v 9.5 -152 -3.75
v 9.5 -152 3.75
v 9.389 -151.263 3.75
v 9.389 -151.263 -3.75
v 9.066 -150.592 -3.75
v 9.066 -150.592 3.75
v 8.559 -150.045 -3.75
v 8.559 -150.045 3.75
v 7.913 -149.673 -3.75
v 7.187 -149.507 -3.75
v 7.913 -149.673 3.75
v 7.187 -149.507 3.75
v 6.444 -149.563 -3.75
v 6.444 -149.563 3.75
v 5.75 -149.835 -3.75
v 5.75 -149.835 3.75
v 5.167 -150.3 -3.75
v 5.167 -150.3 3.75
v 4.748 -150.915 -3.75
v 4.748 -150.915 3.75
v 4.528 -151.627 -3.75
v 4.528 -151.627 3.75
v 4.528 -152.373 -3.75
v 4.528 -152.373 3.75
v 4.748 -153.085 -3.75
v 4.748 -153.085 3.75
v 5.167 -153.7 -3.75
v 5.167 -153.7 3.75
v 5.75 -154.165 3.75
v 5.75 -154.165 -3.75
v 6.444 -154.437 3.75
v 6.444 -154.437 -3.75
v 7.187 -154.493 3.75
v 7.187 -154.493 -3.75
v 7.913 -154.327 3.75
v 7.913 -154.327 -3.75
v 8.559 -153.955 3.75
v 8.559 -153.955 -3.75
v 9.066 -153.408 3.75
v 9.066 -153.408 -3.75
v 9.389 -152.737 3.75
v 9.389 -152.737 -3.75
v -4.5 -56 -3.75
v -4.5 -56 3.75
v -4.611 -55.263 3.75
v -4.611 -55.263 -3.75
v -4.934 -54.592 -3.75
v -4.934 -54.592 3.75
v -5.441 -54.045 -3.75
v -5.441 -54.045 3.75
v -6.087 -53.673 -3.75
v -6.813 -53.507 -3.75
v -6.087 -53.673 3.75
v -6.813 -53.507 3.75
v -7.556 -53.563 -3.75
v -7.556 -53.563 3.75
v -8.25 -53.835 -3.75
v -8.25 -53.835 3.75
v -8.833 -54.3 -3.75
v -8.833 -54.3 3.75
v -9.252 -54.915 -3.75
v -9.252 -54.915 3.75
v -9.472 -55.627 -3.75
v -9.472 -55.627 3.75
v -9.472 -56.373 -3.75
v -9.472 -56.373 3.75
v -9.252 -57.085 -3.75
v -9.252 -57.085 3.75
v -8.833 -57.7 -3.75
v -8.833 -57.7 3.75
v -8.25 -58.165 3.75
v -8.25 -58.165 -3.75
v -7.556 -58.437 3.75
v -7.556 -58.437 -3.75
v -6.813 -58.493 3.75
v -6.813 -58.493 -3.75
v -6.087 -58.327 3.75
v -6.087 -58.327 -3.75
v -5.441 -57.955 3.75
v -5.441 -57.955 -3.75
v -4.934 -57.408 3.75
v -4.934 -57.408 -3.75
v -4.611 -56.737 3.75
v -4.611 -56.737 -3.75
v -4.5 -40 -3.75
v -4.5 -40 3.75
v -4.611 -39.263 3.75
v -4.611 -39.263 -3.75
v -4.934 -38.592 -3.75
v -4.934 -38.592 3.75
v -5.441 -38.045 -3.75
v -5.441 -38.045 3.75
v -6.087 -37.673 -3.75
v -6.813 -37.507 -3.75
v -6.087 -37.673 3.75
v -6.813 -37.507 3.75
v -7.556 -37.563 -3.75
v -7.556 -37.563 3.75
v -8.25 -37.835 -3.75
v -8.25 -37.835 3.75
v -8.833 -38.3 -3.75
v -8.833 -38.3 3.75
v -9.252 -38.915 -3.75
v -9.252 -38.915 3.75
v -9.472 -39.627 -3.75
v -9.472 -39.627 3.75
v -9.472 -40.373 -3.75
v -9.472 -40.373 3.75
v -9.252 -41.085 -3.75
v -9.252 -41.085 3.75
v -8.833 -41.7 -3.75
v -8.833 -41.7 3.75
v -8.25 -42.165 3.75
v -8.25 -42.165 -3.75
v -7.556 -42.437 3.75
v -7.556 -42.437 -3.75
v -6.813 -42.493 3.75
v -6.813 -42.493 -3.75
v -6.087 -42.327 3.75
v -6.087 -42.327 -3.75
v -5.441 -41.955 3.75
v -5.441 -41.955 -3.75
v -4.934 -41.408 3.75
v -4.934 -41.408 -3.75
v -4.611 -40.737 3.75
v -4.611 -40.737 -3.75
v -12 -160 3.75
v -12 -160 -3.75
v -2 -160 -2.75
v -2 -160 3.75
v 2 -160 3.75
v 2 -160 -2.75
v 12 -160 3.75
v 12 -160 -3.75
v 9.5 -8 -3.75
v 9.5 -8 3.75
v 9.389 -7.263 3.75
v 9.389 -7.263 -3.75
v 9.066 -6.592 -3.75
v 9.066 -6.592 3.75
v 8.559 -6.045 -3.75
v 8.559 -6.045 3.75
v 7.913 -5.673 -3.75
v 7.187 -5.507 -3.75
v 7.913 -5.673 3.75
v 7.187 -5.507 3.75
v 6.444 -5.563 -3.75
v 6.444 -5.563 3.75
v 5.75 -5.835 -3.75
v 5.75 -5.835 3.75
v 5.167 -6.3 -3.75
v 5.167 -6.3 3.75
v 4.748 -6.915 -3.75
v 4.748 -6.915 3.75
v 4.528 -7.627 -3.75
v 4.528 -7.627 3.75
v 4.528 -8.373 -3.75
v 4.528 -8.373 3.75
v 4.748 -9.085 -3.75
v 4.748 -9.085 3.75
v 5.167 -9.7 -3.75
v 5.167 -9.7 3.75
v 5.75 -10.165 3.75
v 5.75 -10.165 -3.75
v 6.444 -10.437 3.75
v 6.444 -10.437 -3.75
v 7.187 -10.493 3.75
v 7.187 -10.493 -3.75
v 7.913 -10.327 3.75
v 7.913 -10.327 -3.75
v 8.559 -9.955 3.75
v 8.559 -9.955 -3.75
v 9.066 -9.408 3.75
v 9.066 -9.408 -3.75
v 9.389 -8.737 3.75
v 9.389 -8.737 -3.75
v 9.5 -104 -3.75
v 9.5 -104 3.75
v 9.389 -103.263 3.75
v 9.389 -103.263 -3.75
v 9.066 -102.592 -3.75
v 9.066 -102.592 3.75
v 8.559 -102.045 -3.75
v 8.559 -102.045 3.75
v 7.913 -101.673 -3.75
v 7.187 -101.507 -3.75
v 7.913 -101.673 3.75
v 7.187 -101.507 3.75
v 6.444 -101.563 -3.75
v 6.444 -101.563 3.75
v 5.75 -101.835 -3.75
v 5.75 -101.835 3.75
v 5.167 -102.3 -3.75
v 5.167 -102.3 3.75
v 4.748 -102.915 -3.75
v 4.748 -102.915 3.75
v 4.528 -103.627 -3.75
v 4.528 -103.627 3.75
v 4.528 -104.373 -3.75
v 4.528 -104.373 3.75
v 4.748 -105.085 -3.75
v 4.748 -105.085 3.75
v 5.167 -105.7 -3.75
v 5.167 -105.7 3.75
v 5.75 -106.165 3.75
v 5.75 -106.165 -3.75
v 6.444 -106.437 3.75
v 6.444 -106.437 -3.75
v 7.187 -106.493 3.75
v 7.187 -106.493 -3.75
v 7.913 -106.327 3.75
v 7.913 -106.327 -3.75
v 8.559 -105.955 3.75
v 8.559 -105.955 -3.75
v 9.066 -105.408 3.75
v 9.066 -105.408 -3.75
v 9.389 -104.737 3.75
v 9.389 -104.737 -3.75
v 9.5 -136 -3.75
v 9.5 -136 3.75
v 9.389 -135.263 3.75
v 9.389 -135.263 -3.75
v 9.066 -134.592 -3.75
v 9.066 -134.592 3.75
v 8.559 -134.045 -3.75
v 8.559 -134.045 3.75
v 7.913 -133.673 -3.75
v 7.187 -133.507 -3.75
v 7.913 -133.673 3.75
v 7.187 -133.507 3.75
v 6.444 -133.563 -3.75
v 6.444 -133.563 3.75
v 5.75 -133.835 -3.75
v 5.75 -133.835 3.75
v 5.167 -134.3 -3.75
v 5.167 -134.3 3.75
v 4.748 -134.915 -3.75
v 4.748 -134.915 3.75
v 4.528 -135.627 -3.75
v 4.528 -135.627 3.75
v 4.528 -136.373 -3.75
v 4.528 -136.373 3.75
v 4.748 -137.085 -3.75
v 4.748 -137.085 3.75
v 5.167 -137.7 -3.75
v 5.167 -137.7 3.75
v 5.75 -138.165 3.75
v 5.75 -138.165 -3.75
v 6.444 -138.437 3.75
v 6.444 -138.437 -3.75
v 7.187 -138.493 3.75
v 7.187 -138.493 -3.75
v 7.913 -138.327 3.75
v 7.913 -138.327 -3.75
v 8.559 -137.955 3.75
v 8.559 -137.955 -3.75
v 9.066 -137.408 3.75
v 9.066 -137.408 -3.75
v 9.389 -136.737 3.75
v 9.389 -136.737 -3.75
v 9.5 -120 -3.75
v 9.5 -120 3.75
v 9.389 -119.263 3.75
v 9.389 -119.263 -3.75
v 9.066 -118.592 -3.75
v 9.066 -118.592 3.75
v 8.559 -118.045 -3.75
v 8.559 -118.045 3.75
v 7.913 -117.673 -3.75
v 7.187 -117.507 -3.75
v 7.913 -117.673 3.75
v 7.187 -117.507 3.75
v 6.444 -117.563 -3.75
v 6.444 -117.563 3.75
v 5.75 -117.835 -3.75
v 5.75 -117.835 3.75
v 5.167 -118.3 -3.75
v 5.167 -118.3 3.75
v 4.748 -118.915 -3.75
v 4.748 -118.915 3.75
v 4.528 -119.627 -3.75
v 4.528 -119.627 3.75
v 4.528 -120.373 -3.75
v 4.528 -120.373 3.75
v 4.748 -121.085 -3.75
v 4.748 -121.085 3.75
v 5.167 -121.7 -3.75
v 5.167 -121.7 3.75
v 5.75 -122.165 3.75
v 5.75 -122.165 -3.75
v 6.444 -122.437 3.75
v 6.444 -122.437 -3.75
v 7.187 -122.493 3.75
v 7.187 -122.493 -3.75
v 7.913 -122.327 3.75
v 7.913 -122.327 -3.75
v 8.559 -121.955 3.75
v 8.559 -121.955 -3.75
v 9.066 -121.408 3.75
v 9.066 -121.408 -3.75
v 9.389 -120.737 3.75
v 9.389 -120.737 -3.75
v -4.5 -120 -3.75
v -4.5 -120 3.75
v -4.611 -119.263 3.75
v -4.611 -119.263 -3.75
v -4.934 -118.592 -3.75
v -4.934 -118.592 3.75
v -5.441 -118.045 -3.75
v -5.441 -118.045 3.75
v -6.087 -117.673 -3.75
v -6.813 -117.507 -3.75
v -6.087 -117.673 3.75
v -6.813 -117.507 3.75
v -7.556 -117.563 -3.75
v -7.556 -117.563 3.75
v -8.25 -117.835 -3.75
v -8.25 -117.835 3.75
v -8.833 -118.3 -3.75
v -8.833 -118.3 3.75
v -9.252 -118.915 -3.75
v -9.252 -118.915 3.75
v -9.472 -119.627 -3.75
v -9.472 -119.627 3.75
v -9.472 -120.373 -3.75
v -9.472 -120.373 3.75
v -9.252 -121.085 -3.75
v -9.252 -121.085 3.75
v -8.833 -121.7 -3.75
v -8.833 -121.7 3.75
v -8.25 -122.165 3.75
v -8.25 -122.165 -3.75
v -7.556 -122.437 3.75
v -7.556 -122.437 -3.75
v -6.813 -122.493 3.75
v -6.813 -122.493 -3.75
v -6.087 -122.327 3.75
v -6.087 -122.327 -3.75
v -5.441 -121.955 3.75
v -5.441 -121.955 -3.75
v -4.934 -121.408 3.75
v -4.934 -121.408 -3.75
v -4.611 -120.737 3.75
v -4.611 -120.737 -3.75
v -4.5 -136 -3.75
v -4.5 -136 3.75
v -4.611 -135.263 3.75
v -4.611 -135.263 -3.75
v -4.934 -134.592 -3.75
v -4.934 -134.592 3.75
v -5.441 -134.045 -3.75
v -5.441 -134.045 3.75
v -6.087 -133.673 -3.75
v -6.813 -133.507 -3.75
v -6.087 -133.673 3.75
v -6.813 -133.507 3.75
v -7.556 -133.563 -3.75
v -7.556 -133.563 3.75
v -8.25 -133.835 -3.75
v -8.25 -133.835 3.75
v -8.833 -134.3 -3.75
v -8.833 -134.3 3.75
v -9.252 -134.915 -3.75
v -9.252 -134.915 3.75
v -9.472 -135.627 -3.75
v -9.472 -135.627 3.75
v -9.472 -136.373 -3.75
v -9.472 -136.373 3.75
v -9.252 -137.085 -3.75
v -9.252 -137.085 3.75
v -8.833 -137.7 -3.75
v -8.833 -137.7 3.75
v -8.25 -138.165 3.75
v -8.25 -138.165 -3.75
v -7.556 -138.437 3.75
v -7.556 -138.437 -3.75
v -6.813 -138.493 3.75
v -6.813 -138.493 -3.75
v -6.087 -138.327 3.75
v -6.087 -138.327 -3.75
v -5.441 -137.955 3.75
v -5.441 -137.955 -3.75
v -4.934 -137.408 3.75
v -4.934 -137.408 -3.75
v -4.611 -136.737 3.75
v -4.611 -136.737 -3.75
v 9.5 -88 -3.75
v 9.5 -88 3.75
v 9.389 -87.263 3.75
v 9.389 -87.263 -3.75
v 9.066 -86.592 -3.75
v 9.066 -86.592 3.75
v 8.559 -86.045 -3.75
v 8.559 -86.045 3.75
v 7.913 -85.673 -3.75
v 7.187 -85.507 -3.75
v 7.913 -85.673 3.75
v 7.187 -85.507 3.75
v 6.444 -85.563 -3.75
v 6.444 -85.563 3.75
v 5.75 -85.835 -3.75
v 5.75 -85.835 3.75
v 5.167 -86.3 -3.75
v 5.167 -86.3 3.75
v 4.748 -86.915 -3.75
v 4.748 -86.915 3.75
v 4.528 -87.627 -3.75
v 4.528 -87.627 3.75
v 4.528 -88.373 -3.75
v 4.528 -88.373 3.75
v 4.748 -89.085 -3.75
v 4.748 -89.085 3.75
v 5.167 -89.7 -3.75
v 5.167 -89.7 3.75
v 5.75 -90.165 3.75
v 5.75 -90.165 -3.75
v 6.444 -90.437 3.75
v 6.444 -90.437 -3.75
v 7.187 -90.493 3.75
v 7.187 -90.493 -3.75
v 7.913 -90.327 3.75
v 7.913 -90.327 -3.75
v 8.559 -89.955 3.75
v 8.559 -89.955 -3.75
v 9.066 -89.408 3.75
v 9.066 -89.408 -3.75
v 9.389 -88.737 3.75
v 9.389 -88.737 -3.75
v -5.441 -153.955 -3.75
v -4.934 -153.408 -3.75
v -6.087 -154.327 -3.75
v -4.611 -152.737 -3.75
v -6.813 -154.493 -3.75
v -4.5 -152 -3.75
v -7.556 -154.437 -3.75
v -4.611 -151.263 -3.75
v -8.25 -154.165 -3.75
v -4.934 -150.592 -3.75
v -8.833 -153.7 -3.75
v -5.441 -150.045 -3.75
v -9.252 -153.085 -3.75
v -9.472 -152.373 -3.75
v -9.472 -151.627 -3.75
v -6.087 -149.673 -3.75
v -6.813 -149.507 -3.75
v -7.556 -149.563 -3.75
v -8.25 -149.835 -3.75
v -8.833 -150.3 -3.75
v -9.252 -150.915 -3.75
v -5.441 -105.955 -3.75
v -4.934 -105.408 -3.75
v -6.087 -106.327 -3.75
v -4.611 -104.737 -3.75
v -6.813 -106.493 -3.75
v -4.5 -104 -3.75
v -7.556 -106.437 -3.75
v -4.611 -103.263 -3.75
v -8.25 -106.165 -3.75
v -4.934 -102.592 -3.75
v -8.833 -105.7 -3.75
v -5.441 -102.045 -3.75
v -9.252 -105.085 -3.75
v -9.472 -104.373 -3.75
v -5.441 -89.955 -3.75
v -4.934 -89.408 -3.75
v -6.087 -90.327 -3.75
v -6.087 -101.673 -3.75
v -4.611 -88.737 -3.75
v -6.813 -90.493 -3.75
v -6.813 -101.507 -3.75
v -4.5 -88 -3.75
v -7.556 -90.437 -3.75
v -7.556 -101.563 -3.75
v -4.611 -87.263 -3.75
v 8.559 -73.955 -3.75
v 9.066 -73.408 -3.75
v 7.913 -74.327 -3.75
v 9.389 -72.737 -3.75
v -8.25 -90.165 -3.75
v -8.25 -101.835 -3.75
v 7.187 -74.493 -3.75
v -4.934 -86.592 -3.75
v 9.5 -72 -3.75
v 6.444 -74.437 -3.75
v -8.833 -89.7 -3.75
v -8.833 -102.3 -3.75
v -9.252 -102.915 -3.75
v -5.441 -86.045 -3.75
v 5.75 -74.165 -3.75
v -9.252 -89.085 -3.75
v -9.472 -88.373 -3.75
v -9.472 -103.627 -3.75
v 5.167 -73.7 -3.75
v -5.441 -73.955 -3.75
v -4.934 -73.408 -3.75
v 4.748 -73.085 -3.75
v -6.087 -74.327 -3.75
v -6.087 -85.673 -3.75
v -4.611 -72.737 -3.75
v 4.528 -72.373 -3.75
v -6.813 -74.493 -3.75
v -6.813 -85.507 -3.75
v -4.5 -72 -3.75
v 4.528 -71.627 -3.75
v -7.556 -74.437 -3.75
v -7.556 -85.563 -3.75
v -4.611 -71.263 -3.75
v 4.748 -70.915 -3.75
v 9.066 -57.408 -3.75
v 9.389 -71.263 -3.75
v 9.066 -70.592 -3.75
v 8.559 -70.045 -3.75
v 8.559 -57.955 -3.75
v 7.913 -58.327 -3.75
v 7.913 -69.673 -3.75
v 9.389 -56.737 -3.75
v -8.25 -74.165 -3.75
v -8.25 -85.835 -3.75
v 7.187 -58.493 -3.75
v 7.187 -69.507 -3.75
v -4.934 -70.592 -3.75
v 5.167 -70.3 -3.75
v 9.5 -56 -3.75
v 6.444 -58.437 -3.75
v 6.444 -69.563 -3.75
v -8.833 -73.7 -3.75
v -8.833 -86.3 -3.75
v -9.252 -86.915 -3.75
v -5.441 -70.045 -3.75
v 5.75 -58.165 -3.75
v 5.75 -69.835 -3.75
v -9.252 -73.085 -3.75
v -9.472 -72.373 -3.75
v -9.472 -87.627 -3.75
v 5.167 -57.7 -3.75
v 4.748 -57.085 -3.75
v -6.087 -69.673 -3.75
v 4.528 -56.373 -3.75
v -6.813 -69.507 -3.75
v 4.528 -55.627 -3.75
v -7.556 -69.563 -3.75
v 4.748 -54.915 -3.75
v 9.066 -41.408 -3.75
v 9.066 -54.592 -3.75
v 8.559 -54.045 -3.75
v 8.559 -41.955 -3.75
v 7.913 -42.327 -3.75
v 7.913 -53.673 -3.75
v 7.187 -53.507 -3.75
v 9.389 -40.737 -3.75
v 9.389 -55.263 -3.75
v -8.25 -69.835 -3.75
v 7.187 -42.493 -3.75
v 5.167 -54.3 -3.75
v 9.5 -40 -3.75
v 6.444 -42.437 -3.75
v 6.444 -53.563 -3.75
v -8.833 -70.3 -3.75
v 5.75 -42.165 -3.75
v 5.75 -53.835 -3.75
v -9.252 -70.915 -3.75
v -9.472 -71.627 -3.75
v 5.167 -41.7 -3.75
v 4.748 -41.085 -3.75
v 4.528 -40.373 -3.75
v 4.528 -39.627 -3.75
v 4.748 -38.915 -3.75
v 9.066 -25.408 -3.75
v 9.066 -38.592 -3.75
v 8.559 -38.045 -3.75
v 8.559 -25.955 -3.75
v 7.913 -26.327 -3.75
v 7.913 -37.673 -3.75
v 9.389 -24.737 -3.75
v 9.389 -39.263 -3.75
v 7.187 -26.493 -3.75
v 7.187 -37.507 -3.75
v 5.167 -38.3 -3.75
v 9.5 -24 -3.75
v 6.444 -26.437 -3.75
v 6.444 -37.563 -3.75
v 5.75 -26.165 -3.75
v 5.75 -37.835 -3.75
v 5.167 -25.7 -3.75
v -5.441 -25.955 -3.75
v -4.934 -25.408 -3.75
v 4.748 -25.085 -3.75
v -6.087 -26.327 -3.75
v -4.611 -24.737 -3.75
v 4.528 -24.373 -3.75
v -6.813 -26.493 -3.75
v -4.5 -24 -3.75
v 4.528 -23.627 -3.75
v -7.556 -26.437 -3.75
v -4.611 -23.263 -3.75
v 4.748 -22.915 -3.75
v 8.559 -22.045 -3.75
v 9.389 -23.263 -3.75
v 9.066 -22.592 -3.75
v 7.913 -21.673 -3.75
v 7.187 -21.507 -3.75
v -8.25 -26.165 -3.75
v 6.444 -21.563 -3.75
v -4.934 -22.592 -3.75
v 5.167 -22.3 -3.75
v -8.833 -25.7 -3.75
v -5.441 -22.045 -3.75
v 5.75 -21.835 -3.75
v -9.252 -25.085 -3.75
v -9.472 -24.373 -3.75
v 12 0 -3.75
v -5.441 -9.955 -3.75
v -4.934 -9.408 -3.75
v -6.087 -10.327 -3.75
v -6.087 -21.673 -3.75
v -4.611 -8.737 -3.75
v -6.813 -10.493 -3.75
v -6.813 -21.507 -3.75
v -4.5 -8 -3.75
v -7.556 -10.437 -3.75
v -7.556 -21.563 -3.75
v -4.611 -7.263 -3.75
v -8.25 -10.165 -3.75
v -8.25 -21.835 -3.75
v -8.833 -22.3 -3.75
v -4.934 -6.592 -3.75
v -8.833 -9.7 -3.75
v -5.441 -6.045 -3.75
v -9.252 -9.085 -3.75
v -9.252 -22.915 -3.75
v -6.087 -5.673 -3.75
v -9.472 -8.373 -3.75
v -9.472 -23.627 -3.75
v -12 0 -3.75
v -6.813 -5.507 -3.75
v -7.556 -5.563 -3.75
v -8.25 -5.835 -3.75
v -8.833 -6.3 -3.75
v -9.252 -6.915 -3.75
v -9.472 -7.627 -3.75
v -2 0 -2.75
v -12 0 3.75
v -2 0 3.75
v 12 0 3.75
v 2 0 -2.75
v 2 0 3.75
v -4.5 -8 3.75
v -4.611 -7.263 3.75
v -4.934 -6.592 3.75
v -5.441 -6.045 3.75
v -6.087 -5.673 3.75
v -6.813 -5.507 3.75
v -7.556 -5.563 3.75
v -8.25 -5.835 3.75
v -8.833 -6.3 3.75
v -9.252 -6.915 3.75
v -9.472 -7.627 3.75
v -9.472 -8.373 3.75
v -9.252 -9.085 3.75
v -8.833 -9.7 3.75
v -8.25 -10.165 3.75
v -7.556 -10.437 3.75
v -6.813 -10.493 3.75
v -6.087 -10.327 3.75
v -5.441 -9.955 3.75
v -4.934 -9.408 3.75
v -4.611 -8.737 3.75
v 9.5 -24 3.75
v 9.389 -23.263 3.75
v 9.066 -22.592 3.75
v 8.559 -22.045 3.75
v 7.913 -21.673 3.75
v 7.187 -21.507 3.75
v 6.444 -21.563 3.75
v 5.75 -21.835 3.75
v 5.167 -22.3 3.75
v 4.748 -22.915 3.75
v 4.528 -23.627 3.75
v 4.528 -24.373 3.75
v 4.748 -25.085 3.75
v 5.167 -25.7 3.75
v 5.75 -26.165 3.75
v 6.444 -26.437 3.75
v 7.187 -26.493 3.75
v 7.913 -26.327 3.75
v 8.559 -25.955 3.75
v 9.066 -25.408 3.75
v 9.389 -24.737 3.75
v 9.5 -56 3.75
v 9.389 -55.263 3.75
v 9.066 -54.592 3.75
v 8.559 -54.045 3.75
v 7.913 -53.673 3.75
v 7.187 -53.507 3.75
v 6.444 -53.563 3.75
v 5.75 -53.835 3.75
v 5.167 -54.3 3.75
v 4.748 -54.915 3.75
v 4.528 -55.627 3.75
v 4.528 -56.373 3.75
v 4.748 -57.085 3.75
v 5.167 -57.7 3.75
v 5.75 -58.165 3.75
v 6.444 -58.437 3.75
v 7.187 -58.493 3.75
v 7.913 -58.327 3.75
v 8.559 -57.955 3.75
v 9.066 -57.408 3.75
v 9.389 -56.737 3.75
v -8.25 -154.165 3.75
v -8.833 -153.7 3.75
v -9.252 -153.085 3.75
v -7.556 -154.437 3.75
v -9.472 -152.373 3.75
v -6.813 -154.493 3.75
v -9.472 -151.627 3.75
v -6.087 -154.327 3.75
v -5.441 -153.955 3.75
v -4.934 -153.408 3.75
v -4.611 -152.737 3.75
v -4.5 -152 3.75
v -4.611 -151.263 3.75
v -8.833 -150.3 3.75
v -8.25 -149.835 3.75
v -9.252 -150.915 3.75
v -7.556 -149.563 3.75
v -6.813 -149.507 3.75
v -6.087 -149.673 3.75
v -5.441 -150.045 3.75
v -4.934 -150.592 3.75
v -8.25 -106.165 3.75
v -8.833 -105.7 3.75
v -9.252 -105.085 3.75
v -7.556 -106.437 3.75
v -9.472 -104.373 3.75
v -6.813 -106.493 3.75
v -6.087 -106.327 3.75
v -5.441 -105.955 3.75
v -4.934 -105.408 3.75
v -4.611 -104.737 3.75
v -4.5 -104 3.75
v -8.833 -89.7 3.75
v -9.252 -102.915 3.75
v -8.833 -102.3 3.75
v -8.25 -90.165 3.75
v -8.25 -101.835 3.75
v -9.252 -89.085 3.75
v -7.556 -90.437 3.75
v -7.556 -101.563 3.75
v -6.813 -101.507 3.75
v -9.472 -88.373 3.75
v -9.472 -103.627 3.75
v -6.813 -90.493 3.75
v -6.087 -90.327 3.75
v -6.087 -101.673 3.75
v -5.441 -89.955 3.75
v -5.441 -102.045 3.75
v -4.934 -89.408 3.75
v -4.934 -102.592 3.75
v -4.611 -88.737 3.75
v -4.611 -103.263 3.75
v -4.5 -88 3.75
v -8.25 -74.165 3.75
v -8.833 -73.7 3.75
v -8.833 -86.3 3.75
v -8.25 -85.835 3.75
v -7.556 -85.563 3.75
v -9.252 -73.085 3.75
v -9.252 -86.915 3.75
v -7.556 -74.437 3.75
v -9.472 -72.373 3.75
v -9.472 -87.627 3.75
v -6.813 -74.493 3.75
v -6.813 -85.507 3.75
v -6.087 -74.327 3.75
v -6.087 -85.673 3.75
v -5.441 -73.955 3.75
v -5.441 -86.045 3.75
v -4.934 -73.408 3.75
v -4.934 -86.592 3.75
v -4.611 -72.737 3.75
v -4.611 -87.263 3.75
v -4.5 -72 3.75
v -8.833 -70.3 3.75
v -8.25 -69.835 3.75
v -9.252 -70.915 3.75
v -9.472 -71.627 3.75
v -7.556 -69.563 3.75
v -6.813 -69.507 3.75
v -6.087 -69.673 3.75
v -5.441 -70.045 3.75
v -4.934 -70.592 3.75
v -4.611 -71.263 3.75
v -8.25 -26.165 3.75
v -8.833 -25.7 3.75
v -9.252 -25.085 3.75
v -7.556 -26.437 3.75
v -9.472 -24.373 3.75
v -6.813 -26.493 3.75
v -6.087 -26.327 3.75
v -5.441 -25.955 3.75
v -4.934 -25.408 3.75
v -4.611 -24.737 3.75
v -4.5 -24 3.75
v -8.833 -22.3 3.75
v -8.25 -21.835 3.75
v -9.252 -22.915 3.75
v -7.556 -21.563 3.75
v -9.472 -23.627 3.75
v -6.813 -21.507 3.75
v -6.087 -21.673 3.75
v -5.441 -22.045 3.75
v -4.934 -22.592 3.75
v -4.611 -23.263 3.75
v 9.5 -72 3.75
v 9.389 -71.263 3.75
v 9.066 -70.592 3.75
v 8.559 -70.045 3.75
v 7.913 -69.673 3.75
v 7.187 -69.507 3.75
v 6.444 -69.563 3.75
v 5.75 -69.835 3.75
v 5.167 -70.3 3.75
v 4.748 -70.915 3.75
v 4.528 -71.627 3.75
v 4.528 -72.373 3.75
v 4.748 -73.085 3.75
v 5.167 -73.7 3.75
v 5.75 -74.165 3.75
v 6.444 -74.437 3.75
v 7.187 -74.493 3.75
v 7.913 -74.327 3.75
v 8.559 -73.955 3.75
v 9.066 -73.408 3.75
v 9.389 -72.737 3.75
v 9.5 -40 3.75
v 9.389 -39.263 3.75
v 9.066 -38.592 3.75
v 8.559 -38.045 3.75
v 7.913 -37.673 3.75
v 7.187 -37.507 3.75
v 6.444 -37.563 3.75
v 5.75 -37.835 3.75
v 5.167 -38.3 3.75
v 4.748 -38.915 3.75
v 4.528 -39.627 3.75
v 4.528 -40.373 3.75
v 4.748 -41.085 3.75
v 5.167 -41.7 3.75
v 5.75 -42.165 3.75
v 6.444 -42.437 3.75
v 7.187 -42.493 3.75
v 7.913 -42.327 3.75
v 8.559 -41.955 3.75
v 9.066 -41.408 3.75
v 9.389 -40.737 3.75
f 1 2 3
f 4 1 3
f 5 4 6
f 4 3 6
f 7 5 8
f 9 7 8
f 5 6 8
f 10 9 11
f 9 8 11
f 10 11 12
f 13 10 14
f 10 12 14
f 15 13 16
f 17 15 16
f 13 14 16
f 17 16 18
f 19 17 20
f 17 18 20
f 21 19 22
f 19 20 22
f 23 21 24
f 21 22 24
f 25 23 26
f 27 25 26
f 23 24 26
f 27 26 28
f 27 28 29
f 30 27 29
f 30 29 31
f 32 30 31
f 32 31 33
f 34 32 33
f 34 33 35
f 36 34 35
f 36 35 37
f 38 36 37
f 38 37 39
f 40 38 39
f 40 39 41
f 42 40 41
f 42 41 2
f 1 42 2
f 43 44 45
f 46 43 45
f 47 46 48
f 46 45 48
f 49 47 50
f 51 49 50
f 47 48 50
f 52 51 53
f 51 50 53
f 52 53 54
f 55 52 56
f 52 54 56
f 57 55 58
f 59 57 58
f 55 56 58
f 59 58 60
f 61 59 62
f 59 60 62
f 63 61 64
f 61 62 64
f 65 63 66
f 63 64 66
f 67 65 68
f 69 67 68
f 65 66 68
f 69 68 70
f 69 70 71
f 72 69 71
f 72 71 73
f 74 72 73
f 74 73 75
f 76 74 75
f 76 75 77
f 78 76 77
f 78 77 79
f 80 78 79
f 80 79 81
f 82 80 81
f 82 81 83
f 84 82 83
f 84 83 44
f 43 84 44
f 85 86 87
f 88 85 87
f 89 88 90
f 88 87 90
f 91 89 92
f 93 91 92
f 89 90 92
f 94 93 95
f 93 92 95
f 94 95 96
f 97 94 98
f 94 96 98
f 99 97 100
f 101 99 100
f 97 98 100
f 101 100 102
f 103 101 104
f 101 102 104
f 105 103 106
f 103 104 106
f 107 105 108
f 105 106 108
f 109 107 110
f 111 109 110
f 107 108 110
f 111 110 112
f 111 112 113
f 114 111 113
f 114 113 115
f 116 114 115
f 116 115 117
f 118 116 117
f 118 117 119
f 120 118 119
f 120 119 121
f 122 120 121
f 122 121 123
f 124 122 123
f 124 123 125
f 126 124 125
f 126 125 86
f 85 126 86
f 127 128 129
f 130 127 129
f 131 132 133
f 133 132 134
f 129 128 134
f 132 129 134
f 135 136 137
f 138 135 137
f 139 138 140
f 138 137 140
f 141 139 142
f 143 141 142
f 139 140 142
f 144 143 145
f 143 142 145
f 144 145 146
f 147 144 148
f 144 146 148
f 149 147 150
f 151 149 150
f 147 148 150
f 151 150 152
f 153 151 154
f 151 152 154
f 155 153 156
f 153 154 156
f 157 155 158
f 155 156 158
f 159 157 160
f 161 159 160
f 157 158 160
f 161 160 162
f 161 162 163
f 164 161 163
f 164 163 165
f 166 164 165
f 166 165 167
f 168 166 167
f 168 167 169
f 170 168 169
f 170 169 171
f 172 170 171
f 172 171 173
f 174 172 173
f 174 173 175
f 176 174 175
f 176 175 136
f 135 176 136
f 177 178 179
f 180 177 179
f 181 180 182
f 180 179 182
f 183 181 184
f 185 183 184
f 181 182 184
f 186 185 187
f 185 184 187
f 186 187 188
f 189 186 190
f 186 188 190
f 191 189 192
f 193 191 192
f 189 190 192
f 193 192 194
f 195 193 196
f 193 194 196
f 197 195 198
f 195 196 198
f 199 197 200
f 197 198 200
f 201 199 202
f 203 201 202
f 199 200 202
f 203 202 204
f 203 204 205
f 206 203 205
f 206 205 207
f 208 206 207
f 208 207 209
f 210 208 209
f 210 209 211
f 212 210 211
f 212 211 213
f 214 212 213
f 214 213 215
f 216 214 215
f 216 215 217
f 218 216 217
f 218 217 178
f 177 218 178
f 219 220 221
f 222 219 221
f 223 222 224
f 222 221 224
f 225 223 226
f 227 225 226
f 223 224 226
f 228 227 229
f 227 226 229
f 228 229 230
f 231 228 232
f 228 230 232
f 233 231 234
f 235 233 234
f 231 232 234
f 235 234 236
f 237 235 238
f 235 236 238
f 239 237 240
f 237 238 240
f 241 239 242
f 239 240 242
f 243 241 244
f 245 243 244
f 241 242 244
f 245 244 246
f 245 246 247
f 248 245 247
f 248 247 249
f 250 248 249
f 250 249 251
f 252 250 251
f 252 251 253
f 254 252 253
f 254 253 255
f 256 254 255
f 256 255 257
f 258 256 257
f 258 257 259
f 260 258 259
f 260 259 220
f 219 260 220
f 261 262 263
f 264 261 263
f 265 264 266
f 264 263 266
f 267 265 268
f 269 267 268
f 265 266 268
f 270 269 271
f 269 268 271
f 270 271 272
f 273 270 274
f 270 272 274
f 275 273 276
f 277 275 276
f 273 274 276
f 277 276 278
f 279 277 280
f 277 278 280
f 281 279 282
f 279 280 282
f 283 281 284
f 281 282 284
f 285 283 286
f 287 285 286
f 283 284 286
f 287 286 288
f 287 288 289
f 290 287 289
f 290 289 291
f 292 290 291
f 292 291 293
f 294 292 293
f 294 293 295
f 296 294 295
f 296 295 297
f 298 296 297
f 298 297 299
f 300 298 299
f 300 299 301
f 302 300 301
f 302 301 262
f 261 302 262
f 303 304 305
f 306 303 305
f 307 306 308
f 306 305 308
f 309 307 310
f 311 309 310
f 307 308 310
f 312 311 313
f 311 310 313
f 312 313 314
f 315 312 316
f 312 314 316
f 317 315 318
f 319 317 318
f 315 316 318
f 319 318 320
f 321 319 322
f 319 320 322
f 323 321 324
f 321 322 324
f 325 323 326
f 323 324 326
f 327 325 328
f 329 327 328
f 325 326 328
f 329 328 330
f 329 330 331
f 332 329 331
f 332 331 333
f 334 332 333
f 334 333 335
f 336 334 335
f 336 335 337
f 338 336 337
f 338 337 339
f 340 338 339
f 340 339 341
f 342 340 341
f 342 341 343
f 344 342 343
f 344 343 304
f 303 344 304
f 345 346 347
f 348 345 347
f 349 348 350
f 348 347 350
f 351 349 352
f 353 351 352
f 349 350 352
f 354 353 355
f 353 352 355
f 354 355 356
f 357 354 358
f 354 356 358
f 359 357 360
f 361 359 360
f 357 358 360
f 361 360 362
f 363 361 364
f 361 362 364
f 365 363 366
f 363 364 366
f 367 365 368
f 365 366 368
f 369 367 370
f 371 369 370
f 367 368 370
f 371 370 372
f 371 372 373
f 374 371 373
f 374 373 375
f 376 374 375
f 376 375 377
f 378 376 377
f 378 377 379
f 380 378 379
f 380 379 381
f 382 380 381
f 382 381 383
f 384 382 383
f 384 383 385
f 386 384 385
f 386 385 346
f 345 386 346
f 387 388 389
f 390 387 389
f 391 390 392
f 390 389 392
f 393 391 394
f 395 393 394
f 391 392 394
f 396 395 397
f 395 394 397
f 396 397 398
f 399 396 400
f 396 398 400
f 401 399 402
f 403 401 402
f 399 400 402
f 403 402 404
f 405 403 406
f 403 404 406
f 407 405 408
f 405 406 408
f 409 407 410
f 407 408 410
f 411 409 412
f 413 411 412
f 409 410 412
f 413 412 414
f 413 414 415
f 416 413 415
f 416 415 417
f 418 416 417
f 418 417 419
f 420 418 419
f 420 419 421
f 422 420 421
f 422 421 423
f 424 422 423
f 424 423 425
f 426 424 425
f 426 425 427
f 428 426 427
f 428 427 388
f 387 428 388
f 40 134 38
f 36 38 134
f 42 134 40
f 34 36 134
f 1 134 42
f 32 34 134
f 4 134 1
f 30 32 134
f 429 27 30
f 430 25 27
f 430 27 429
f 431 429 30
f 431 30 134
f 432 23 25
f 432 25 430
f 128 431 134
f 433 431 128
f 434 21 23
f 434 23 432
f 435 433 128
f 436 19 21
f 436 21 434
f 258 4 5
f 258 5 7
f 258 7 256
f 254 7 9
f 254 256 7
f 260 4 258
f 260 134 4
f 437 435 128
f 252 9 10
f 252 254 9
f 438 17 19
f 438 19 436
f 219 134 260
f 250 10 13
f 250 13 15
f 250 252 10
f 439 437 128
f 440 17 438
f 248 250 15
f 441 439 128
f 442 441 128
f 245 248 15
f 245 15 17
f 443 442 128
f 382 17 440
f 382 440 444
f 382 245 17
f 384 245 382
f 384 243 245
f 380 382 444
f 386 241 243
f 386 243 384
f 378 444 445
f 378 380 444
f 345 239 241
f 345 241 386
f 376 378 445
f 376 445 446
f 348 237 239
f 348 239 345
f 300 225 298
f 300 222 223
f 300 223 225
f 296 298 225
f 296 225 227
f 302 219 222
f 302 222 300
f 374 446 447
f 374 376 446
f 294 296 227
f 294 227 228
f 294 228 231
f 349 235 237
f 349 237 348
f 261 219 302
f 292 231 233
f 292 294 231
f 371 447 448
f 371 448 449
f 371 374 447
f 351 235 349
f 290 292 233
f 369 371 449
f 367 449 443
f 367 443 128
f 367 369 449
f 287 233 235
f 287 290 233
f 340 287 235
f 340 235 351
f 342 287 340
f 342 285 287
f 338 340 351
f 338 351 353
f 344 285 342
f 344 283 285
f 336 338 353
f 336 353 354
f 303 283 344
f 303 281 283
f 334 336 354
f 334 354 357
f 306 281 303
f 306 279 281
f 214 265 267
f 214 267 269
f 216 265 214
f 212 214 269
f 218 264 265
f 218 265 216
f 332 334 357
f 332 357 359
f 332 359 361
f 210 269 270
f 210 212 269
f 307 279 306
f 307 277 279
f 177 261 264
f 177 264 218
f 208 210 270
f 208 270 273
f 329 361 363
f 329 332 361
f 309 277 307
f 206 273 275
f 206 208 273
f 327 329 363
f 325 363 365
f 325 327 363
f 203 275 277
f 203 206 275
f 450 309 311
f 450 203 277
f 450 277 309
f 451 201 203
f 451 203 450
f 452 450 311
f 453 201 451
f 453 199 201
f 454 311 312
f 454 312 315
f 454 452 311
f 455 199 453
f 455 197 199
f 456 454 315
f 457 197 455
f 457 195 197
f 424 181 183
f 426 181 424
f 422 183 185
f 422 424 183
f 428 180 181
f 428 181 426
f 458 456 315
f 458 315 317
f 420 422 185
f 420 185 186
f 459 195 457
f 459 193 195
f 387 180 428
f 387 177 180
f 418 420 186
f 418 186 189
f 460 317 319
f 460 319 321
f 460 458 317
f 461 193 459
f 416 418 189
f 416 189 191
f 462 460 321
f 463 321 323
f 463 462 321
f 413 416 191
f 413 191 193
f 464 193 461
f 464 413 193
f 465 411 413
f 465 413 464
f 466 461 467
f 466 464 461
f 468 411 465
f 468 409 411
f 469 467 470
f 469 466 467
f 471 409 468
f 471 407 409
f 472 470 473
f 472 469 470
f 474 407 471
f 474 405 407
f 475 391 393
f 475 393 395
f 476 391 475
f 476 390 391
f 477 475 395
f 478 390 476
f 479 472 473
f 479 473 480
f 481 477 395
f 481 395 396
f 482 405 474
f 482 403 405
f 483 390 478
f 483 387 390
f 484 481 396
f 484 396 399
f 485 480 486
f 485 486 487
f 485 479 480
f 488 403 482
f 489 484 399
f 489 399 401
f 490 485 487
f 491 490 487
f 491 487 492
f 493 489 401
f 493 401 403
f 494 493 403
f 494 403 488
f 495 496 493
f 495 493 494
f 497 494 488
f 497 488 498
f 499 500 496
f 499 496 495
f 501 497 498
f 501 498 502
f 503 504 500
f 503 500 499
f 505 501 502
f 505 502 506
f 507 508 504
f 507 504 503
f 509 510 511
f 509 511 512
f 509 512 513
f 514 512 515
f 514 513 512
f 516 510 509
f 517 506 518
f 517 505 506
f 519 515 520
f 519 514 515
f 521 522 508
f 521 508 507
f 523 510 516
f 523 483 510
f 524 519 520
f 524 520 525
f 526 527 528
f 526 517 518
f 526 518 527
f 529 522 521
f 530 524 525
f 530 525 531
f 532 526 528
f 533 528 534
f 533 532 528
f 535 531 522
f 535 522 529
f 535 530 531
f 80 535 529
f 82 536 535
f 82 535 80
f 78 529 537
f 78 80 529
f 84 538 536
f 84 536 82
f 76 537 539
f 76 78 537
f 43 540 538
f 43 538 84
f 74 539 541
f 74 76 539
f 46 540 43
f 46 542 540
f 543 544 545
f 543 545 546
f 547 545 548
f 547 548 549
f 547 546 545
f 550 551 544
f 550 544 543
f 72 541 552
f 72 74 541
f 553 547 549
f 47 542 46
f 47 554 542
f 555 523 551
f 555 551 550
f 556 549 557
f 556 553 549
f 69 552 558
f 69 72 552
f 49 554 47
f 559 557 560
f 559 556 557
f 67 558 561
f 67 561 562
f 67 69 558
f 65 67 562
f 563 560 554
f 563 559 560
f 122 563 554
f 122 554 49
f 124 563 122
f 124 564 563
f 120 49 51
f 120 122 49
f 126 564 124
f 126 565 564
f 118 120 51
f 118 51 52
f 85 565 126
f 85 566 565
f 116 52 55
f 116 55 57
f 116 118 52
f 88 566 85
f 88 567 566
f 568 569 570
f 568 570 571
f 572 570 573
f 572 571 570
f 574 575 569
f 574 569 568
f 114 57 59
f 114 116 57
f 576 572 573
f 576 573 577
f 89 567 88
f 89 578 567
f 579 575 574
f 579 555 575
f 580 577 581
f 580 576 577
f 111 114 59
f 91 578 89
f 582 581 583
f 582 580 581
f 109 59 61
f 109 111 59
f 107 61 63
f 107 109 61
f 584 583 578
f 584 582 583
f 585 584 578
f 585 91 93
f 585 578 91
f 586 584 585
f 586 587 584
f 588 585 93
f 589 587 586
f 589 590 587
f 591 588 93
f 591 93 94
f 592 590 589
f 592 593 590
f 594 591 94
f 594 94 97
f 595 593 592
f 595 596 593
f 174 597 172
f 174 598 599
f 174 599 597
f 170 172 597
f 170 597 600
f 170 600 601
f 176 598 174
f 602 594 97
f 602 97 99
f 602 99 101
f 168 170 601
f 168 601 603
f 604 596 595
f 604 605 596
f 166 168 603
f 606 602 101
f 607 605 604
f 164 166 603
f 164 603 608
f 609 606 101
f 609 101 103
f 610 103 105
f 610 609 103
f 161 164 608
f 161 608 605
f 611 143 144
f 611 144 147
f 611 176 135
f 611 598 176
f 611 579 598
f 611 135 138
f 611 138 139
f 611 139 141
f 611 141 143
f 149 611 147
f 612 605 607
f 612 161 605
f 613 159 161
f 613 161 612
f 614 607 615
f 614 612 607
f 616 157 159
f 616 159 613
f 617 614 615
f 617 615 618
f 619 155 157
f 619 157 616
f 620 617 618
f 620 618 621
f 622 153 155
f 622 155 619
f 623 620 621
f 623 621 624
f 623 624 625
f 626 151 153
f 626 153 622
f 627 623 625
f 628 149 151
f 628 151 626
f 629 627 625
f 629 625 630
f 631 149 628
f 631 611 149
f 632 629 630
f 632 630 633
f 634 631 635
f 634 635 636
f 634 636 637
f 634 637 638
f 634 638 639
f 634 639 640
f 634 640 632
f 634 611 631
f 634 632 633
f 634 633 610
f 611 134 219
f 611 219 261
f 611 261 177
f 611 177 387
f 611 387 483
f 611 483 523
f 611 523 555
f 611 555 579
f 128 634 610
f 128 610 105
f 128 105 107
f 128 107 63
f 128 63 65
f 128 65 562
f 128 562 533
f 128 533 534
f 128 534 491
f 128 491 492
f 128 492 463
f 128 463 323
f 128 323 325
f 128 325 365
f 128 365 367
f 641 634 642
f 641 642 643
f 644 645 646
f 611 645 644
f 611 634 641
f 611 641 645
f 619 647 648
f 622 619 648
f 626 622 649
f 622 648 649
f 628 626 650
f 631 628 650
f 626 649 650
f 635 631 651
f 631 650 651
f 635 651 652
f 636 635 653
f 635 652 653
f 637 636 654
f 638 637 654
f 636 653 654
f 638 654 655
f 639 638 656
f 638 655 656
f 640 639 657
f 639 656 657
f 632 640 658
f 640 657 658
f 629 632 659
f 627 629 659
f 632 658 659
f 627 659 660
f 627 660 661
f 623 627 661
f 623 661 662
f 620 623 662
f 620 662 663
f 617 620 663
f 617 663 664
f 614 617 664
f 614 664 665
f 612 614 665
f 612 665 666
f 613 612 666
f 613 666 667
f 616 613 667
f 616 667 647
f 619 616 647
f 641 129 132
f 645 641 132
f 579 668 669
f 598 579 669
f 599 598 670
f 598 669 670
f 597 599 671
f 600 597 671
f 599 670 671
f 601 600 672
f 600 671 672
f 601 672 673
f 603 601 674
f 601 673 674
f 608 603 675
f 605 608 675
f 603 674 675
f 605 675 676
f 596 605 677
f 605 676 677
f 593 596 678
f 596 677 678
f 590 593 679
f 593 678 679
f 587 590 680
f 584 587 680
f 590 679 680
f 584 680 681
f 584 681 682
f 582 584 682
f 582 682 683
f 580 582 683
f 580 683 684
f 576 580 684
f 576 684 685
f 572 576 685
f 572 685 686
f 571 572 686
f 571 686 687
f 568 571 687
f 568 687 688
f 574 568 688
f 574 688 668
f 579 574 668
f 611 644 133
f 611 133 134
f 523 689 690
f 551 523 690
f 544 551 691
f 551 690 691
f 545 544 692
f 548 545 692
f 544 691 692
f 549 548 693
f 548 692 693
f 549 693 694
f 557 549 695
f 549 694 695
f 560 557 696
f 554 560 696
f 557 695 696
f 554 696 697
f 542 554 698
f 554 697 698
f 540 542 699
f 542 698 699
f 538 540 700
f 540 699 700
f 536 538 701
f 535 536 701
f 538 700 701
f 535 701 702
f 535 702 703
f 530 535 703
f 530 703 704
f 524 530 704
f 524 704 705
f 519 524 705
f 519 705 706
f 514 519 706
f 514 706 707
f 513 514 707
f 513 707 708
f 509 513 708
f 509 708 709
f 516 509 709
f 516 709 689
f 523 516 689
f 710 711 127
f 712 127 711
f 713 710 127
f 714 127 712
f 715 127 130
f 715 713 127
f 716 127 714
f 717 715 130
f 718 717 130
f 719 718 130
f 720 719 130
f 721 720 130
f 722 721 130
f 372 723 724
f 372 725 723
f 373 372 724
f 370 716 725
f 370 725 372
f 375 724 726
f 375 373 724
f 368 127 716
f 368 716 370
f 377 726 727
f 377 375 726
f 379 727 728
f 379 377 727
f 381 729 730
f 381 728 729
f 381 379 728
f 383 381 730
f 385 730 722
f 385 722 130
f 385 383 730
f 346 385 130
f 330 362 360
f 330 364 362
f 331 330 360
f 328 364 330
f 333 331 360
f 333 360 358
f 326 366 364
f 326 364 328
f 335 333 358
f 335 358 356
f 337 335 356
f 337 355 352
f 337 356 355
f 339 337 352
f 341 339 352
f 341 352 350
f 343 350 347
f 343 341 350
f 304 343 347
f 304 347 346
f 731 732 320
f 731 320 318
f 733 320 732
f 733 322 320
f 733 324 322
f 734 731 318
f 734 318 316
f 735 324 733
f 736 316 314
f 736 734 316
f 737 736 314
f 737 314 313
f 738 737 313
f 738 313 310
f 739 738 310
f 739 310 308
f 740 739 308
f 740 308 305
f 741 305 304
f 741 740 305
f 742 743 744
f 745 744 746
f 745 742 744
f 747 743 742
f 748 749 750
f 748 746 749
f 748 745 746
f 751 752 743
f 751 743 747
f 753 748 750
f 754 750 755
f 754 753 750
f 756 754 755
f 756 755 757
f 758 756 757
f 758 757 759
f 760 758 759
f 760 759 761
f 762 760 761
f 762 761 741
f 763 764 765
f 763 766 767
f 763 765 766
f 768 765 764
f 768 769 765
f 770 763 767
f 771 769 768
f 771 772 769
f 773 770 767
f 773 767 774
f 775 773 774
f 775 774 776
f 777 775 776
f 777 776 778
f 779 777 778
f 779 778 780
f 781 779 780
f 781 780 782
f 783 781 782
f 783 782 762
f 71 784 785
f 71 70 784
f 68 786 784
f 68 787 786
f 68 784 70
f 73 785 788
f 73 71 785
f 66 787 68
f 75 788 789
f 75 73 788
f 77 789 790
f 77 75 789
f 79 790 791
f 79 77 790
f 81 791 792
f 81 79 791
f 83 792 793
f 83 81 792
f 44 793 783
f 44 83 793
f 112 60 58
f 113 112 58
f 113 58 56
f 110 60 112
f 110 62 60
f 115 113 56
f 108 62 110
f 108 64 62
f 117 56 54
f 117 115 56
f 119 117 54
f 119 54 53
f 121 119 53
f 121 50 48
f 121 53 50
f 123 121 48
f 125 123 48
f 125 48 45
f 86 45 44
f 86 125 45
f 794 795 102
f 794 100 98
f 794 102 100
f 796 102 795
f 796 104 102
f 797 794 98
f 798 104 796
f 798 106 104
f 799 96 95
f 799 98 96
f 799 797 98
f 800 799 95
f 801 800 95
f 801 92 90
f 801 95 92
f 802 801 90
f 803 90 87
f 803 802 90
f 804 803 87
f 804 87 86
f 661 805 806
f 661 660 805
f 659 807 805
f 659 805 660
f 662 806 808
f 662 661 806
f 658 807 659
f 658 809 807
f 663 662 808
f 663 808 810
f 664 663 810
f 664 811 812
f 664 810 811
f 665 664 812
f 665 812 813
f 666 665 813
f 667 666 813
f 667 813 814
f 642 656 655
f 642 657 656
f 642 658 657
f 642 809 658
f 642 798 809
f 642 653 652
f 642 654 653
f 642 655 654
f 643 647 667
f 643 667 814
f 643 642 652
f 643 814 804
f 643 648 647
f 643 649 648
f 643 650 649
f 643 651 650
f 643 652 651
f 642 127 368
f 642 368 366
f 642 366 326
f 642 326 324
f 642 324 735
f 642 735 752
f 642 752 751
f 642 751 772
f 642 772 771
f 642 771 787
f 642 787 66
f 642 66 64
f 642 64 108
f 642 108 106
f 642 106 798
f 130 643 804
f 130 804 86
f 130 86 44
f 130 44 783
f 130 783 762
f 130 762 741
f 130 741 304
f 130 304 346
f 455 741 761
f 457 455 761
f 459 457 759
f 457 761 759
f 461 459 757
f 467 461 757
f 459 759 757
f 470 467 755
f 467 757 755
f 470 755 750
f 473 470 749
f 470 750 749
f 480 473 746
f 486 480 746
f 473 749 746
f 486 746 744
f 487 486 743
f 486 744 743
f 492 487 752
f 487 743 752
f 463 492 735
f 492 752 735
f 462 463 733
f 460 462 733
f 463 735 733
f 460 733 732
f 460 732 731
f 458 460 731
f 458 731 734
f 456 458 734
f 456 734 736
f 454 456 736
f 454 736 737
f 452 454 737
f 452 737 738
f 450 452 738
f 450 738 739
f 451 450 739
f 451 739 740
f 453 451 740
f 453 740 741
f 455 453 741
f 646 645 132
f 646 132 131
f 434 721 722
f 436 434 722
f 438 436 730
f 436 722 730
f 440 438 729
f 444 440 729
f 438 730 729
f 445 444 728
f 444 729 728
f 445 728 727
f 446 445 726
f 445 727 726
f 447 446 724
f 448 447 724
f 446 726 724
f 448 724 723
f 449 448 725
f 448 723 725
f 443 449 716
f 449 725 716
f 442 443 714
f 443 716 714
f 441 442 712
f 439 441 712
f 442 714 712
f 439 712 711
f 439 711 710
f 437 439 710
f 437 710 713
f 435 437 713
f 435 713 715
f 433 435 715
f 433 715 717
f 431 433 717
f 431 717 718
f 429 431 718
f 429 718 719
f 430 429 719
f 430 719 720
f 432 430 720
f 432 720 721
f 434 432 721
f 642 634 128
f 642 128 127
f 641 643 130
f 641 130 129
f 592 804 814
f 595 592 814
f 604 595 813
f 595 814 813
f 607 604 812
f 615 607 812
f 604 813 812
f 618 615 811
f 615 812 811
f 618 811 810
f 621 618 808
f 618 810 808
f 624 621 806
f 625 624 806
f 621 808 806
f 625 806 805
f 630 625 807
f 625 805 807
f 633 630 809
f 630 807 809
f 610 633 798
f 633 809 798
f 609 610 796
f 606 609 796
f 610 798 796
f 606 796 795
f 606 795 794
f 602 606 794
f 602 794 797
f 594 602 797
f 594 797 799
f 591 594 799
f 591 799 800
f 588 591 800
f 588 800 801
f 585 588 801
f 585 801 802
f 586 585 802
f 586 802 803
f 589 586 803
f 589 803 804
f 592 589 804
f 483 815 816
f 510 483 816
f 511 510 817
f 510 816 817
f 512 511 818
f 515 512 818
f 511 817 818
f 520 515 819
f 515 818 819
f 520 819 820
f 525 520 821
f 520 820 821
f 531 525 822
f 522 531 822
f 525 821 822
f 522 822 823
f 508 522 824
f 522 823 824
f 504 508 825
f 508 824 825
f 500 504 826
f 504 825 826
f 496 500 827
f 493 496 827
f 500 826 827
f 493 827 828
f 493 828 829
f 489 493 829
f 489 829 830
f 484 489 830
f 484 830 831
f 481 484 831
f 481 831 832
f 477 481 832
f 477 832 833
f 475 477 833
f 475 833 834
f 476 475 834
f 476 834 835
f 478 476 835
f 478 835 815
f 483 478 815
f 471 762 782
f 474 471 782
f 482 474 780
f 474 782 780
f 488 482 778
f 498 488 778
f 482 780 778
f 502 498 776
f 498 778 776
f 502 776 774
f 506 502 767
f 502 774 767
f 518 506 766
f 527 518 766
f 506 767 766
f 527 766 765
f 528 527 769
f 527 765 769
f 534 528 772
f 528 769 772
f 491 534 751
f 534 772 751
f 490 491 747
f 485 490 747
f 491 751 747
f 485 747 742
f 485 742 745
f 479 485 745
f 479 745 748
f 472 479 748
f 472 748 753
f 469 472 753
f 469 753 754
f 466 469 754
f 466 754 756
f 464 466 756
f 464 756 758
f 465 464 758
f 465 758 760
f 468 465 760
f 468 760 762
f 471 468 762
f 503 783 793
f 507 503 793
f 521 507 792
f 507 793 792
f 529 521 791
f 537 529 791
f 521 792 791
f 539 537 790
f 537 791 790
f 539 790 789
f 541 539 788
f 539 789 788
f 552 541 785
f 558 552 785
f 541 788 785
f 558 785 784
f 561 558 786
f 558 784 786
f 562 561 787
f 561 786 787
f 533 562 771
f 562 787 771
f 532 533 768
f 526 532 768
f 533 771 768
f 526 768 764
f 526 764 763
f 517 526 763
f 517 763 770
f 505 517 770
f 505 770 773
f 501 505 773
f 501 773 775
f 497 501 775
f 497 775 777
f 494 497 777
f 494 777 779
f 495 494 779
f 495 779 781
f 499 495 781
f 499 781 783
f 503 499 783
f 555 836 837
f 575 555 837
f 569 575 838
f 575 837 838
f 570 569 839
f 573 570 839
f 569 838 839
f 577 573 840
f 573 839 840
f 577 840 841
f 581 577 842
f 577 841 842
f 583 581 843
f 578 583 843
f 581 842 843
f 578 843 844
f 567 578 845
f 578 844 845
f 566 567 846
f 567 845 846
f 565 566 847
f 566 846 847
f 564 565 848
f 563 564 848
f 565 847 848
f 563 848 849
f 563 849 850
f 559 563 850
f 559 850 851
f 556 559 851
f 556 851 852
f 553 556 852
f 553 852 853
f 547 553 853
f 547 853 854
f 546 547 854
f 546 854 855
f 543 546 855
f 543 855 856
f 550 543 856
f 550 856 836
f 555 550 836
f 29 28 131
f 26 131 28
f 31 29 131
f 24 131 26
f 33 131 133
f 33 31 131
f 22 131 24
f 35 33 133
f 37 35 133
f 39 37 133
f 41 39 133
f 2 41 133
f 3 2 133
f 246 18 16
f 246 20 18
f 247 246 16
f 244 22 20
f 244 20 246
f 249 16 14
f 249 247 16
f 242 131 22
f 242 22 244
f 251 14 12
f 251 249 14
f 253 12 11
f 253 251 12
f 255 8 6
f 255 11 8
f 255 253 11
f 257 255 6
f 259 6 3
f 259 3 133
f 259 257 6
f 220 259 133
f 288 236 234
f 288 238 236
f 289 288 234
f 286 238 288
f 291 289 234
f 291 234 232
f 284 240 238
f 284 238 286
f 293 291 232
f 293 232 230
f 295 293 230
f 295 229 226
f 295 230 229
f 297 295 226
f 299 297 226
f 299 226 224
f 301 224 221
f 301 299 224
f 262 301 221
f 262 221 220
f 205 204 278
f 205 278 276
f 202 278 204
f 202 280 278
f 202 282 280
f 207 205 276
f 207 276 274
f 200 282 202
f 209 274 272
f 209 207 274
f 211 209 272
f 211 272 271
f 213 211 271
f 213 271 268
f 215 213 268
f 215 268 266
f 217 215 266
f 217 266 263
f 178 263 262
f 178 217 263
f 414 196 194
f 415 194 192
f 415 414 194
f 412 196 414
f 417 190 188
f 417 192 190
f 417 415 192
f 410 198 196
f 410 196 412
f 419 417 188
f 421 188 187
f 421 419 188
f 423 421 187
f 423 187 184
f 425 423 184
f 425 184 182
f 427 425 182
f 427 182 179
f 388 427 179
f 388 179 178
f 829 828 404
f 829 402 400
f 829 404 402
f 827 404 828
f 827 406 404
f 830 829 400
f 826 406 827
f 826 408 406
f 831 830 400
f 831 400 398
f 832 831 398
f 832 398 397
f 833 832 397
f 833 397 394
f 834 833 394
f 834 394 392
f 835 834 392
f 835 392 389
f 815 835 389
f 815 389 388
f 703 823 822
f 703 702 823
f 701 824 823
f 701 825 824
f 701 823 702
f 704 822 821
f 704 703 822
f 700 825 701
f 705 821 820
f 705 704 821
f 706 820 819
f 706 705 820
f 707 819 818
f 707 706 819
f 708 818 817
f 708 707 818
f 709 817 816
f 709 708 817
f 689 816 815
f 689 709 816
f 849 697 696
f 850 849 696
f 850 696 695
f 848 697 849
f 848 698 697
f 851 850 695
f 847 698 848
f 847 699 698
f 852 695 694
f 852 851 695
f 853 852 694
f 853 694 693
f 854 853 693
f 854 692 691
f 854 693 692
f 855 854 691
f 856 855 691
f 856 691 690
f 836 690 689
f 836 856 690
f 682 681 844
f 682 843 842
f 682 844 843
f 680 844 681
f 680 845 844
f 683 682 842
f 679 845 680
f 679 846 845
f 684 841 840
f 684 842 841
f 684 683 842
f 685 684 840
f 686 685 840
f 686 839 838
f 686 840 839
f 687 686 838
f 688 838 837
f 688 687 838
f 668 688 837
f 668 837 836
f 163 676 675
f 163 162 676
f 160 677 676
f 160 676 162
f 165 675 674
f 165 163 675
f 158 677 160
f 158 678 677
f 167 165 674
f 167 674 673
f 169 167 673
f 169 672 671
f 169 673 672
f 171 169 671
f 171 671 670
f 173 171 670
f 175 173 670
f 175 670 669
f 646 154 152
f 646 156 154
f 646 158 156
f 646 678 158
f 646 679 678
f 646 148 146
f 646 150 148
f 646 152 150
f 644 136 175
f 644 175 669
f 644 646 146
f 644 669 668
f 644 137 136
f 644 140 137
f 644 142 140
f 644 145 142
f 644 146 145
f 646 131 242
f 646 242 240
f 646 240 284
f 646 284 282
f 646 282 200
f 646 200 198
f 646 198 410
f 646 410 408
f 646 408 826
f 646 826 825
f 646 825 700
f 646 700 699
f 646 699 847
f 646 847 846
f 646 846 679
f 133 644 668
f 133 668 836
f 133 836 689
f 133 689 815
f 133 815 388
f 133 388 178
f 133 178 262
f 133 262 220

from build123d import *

# Parameters (mm, degrees)
BASE_DEPTH  = 160
ESQUISSE2_R = 2.5
TROU_DEPTH  = 161.624562256


with BuildPart() as part:
    # Esquisse1 → BASE (new body)
    with BuildSketch(Plane(origin=(0, 0, 0), x_dir=(1, 0, 0), z_dir=(0, 1, 0))):
        Polygon((-2, -3.75), (-2, 2.75), (2, 2.75), (2, -3.75), (12, -3.75), (12, 3.75), (-12, 3.75), (-12, -3.75), align=None)
    extrude(amount=-BASE_DEPTH)

    # Esquisse2 → TROU (cut, through all)
    with BuildSketch(Plane.XY.offset(3.75)):
        with Locations((-7, -8)):
            Circle(ESQUISSE2_R)
        with Locations((7, -8)):
            Circle(ESQUISSE2_R)
        with Locations((7, -24)):
            Circle(ESQUISSE2_R)
        with Locations((7, -40)):
            Circle(ESQUISSE2_R)
        with Locations((7, -56)):
            Circle(ESQUISSE2_R)
        with Locations((7, -72)):
            Circle(ESQUISSE2_R)
        with Locations((7, -88)):
            Circle(ESQUISSE2_R)
        with Locations((7, -104)):
            Circle(ESQUISSE2_R)
        with Locations((7, -120)):
            Circle(ESQUISSE2_R)
        with Locations((7, -136)):
            Circle(ESQUISSE2_R)
        with Locations((7, -152)):
            Circle(ESQUISSE2_R)
        with Locations((-7, -24)):
            Circle(ESQUISSE2_R)
        with Locations((-7, -40)):
            Circle(ESQUISSE2_R)
        with Locations((-7, -56)):
            Circle(ESQUISSE2_R)
        with Locations((-7, -72)):
            Circle(ESQUISSE2_R)
        with Locations((-7, -88)):
            Circle(ESQUISSE2_R)
        with Locations((-7, -104)):
            Circle(ESQUISSE2_R)
        with Locations((-7, -120)):
            Circle(ESQUISSE2_R)
        with Locations((-7, -136)):
            Circle(ESQUISSE2_R)
        with Locations((-7, -152)):
            Circle(ESQUISSE2_R)
    extrude(amount=-TROU_DEPTH, mode=Mode.SUBTRACT)


solid = part.part
